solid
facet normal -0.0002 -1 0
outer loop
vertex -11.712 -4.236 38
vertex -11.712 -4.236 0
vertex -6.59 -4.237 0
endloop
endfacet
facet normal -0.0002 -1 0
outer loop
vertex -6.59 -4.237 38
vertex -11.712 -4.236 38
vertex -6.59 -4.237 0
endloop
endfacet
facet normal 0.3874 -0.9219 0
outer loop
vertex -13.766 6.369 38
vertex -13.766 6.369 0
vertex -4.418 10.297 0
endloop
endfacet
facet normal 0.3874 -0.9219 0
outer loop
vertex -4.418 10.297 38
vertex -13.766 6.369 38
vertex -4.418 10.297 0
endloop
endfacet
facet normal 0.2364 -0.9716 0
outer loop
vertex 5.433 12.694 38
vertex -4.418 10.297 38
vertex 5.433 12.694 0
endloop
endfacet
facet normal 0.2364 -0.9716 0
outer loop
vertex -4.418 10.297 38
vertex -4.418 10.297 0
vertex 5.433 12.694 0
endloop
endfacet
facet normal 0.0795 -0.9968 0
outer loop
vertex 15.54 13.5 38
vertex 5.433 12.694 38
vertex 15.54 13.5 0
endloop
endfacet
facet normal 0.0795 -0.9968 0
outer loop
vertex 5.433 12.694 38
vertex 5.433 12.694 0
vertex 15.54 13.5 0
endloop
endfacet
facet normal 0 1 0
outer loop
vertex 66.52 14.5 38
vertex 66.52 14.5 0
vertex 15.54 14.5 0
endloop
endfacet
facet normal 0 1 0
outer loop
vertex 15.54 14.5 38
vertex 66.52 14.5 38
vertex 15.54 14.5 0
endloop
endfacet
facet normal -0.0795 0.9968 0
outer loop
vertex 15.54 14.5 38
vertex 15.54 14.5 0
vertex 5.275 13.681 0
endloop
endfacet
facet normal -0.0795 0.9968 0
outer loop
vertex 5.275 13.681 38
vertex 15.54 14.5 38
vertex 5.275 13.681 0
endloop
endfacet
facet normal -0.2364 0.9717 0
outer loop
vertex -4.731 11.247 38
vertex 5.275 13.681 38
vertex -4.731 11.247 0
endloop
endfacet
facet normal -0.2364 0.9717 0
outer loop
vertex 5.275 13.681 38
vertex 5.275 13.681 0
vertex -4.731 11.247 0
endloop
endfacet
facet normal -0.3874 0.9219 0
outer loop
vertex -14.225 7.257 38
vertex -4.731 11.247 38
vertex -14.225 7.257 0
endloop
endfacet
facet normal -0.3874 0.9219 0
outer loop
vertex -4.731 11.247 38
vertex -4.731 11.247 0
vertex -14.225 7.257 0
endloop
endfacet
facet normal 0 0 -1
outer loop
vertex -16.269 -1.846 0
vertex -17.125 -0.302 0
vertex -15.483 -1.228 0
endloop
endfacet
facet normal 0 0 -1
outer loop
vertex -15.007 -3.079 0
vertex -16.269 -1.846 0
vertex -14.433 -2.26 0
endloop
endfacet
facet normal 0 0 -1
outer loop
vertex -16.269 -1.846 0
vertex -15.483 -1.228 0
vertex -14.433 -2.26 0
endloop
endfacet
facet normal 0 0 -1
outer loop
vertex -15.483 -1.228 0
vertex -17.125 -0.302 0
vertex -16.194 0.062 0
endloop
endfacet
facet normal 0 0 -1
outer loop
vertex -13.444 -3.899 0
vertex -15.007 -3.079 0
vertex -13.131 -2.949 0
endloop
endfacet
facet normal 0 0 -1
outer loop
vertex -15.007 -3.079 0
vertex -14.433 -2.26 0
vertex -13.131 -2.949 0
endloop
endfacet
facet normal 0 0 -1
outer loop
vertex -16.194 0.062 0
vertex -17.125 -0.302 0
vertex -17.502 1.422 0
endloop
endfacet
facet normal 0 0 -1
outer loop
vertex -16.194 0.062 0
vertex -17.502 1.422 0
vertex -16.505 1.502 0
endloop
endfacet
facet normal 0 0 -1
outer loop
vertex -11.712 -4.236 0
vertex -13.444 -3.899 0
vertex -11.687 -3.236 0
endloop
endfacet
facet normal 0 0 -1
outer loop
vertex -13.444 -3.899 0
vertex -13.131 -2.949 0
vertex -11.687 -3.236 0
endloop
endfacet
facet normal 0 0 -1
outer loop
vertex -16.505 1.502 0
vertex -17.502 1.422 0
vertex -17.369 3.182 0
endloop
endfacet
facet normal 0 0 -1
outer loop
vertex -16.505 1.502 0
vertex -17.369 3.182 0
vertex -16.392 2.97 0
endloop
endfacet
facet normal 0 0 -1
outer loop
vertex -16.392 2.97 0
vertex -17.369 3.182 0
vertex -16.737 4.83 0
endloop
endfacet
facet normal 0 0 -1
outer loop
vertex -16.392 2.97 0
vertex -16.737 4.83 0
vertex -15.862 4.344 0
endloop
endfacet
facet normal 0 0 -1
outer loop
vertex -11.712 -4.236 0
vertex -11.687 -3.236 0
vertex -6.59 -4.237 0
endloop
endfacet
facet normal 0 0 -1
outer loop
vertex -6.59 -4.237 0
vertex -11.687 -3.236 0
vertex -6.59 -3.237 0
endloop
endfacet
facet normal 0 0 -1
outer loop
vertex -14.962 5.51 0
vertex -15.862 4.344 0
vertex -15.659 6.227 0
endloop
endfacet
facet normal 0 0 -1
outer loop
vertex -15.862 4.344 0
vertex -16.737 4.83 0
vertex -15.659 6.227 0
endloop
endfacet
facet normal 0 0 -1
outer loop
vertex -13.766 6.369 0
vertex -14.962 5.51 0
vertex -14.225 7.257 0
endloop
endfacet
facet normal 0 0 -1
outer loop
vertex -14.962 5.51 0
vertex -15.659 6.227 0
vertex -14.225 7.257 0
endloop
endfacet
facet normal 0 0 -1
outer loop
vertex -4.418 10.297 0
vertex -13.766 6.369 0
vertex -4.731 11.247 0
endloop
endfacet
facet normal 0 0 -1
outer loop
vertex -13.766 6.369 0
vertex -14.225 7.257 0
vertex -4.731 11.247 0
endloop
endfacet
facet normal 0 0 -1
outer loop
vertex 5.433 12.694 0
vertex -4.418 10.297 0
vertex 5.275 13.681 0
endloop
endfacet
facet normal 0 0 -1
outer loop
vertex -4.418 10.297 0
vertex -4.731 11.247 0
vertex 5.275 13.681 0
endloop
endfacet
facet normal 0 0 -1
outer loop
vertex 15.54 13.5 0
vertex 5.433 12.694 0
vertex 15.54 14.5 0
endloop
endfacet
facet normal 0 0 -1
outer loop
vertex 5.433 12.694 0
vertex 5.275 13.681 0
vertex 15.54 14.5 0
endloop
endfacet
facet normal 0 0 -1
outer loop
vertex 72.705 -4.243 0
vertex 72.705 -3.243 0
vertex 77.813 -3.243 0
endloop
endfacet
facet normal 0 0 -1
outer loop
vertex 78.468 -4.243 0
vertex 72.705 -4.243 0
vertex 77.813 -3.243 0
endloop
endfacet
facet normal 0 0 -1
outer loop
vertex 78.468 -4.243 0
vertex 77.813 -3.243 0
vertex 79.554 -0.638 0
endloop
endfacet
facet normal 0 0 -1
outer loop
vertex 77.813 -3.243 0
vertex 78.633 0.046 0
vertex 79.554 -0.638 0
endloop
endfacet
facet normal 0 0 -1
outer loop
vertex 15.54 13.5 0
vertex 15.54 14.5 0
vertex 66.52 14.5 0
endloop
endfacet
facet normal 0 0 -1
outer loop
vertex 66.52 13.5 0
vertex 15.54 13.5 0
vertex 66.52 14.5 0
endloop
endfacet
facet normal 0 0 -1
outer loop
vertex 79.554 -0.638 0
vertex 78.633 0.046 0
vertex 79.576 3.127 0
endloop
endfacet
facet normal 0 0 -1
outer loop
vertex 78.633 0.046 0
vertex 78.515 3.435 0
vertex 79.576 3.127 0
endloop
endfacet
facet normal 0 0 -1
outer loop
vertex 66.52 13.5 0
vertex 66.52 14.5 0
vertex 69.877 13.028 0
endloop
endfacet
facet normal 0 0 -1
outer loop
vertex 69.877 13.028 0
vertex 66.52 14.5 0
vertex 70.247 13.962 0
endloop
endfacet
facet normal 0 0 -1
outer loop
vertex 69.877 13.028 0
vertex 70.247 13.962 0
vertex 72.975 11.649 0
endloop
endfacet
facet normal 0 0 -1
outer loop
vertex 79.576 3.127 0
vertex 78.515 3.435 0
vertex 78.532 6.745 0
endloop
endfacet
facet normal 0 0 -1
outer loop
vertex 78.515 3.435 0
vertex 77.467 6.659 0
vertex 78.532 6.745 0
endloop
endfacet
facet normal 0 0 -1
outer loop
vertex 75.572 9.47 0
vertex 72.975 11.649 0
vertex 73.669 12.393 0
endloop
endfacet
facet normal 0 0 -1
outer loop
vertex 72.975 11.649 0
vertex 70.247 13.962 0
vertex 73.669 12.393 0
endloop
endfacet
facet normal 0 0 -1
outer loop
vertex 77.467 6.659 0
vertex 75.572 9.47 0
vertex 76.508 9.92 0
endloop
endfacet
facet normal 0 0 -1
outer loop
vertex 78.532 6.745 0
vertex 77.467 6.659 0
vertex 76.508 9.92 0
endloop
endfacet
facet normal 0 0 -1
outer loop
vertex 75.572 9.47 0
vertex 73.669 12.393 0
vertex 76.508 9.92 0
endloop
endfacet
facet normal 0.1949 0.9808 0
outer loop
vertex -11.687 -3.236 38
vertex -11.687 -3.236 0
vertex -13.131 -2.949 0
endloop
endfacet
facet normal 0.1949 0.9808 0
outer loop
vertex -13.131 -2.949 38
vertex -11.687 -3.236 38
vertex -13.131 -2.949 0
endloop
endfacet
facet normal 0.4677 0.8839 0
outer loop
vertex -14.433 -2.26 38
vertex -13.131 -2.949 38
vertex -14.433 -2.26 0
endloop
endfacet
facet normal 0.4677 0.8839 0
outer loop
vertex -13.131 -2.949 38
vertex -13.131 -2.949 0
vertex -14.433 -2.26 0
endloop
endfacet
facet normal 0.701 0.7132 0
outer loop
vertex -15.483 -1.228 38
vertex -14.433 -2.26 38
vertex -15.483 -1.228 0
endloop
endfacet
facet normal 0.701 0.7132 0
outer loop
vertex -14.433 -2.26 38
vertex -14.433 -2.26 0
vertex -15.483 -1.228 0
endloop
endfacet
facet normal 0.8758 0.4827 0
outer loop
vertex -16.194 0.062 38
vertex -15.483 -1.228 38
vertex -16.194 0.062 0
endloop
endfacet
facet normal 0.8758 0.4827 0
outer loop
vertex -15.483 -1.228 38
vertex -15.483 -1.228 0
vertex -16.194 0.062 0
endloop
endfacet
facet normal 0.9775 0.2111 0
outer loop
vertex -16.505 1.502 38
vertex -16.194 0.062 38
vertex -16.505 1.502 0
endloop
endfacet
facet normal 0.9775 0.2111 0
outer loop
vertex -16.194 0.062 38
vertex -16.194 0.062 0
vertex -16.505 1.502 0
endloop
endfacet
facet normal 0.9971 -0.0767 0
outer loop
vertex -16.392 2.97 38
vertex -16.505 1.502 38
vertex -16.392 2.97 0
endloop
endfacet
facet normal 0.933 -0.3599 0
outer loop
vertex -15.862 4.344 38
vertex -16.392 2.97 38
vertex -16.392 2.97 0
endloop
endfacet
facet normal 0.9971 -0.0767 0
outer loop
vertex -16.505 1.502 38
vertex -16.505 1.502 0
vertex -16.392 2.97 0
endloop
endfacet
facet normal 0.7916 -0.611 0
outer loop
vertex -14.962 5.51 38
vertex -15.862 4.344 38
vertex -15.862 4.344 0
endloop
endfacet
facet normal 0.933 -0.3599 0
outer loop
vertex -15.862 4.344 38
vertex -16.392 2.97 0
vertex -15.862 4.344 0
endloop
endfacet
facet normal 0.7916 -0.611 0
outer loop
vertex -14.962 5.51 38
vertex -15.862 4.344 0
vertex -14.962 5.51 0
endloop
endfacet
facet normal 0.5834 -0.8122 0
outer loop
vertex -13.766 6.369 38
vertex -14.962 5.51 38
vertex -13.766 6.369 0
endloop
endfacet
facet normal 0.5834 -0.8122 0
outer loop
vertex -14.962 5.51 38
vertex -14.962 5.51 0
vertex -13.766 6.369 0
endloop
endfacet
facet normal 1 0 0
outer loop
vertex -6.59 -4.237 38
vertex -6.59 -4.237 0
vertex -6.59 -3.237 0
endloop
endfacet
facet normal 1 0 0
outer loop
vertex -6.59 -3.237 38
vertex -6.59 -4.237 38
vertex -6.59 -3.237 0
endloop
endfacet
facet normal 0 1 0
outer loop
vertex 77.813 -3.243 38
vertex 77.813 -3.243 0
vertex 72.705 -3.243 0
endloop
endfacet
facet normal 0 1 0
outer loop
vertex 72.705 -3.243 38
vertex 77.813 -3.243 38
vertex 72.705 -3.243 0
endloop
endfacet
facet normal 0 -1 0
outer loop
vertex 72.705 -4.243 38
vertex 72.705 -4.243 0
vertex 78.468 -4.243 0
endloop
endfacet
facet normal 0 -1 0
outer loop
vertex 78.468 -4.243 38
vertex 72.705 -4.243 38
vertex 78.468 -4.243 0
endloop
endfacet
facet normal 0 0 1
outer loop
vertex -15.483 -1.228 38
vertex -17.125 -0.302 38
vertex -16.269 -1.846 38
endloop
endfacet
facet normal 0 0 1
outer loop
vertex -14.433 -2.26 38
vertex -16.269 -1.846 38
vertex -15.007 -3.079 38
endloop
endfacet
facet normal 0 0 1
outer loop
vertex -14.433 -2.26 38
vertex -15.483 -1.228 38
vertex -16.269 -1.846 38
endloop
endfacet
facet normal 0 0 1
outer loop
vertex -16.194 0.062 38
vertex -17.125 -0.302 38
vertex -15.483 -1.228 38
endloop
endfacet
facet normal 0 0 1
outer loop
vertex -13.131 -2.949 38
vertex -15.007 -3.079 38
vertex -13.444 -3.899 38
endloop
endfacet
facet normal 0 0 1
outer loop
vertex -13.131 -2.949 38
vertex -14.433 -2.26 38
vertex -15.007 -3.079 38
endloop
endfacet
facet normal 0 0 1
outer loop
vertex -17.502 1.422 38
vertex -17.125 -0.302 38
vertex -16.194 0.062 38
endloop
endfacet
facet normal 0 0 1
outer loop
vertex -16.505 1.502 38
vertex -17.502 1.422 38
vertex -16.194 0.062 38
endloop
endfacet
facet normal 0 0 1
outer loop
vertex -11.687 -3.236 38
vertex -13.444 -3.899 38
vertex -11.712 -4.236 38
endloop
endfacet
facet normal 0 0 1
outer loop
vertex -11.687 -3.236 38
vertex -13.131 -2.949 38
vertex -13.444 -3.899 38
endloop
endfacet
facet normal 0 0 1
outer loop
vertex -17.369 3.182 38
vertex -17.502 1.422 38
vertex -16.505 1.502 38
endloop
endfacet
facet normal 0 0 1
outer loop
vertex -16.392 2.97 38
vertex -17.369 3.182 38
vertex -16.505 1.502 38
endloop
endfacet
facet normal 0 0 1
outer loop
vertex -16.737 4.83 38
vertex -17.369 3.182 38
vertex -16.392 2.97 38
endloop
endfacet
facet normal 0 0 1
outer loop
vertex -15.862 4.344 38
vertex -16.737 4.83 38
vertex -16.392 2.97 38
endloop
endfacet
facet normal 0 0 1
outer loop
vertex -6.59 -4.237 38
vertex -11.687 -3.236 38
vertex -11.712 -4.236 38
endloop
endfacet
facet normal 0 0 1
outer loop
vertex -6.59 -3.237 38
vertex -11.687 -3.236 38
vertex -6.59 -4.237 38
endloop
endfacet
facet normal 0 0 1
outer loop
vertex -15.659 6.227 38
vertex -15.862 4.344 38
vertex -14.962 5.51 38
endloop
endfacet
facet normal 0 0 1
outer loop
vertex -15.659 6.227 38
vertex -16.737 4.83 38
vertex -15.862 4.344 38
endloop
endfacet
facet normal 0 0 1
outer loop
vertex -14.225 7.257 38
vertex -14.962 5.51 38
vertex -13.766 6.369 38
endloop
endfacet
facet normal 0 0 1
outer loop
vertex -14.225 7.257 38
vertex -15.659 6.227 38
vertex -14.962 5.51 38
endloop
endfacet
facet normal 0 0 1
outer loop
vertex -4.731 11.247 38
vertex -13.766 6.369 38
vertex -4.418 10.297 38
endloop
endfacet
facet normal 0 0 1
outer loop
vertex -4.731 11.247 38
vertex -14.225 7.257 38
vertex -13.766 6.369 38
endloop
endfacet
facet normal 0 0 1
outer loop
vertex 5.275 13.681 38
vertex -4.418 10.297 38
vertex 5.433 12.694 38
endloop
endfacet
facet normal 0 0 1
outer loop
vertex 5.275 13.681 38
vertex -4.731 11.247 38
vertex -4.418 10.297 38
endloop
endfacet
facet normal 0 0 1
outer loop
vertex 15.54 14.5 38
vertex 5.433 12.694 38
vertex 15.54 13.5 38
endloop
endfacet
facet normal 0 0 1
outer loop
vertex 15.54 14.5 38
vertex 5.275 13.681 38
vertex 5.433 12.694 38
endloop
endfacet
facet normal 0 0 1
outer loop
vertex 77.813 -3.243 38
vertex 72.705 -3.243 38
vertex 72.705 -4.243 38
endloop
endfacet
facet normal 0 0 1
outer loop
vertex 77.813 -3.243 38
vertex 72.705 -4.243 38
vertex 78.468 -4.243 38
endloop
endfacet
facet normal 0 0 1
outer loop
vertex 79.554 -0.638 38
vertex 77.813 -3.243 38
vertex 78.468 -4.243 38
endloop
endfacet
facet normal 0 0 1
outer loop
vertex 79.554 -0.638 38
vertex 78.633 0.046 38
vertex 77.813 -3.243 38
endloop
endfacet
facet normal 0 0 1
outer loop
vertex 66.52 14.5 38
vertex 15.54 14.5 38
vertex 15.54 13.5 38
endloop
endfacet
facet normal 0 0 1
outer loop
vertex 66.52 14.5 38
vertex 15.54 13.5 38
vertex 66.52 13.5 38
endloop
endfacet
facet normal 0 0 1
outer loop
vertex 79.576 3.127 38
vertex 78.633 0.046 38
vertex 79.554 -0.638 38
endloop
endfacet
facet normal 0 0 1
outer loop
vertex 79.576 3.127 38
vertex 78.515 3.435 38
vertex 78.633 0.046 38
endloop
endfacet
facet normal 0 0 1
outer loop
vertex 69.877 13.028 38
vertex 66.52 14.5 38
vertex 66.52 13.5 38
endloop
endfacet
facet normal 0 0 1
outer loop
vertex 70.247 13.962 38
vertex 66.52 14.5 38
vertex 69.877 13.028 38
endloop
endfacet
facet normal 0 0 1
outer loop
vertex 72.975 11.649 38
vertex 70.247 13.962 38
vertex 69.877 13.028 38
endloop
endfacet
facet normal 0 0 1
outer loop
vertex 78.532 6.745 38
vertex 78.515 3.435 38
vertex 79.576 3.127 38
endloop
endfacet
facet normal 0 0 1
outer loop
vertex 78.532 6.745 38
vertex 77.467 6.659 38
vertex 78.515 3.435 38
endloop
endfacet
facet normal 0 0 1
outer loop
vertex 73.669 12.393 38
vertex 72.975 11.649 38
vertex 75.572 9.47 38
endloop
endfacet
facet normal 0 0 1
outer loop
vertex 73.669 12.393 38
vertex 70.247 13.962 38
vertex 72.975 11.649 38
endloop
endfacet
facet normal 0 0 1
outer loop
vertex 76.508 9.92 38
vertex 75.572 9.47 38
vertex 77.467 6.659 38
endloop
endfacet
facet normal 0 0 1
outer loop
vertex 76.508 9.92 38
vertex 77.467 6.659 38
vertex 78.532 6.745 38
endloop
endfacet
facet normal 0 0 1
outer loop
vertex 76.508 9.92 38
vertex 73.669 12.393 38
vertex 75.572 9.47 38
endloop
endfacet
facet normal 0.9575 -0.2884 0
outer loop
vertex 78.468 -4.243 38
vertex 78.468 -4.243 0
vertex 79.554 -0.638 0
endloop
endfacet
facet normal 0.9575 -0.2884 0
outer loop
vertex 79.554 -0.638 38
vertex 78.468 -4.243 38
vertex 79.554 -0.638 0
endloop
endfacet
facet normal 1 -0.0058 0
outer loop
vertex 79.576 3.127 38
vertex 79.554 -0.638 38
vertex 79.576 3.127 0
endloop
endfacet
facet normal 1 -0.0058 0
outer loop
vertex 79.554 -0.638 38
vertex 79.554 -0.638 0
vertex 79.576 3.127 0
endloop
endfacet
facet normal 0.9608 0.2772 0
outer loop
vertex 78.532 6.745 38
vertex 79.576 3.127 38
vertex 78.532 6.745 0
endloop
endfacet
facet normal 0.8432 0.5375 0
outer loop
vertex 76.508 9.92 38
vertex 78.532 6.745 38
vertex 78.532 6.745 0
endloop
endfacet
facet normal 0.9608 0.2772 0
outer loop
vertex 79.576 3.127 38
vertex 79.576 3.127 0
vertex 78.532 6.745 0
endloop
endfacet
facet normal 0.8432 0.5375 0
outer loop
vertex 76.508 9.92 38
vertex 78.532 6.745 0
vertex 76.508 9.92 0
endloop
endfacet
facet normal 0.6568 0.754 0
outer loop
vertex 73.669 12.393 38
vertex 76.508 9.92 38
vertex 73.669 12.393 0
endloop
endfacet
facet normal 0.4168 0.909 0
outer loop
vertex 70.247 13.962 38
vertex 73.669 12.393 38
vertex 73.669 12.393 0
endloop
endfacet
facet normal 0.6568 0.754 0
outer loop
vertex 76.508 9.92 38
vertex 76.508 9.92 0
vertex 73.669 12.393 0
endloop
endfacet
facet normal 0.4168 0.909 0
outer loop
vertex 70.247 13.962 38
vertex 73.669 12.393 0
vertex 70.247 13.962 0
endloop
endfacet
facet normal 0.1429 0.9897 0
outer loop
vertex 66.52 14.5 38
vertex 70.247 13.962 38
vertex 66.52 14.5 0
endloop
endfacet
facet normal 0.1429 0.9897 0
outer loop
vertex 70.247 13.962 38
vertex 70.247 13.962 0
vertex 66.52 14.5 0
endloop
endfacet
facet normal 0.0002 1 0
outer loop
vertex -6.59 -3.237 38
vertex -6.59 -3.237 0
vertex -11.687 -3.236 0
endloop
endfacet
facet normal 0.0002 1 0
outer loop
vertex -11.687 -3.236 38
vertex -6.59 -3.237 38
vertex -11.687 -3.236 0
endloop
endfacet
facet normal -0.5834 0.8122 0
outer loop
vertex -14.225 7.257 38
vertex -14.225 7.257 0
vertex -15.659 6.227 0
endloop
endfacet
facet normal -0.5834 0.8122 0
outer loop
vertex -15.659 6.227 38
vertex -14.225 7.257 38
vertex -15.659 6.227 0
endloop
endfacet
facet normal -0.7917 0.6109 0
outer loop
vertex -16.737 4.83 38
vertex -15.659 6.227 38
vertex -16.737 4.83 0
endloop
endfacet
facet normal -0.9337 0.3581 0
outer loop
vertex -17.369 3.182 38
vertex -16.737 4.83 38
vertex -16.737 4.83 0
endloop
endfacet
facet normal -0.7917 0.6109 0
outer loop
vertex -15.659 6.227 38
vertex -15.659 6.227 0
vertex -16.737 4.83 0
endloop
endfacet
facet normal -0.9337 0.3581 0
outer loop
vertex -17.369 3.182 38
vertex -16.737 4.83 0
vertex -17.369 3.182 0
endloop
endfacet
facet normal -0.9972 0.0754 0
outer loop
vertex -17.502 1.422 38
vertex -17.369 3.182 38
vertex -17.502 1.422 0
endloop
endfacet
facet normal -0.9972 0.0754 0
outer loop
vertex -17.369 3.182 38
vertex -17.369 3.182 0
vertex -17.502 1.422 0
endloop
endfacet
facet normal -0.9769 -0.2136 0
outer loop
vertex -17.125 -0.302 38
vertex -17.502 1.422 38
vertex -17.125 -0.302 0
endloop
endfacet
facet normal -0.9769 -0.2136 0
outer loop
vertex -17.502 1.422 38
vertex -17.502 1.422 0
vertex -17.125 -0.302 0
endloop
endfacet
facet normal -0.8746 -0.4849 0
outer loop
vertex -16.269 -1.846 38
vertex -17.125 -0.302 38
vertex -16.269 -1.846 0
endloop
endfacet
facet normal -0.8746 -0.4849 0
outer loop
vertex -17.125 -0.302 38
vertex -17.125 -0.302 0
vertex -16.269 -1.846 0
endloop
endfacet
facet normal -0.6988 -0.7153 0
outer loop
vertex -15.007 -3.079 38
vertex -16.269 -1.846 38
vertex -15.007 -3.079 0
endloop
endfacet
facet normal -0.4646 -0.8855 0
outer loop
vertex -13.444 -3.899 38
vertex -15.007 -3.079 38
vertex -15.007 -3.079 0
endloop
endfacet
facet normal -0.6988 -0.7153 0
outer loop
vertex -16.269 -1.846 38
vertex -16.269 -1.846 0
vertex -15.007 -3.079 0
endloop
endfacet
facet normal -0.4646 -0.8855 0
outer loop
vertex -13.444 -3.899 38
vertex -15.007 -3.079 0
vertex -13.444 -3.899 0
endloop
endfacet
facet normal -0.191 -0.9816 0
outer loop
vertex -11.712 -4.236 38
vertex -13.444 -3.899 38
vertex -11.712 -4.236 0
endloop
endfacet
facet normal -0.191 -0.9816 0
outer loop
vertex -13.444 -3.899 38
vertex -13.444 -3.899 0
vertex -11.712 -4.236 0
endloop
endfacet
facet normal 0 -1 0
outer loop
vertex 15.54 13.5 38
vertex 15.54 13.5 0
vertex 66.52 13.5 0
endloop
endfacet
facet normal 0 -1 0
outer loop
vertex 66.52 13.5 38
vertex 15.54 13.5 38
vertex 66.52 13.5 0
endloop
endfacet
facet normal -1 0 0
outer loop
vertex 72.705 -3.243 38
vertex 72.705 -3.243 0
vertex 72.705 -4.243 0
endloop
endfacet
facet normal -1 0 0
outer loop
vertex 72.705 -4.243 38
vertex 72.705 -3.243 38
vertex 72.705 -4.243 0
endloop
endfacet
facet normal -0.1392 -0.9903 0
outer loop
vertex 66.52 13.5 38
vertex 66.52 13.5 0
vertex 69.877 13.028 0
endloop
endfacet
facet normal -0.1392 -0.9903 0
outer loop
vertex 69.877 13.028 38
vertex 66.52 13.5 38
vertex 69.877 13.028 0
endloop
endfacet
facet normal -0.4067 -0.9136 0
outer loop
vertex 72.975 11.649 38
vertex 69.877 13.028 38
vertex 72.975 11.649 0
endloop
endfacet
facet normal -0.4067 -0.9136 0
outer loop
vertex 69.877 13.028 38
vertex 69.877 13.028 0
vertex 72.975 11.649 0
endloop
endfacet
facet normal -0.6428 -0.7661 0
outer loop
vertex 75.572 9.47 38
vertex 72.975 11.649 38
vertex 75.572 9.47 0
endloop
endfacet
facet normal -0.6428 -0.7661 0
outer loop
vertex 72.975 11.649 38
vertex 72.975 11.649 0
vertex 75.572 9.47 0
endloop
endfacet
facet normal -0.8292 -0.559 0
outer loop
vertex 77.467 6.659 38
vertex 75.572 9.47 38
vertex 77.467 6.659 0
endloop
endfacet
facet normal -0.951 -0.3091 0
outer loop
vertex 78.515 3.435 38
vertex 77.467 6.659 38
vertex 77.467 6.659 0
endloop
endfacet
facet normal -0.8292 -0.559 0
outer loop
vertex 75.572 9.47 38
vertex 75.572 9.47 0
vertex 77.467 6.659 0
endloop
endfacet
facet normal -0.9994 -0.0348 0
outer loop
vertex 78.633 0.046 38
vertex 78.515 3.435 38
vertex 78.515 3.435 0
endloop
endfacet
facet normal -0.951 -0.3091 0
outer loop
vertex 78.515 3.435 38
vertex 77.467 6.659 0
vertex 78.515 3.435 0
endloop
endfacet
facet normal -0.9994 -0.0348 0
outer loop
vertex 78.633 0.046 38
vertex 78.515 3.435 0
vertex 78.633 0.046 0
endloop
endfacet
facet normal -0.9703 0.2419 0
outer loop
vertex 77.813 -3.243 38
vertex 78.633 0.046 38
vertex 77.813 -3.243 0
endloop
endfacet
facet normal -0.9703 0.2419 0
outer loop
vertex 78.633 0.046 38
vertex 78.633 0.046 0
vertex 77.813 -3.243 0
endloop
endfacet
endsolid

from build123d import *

# Parameters (mm, degrees)
BOSS_EXTRUDE1_DEPTH = 38


with BuildPart() as part:
    # Sketch1 → Boss-Extrude1 (new body)
    with BuildSketch(Plane.XY):
        with BuildLine():
            Line((66.52, 14.5), (15.54, 14.5))
            ThreePointArc((15.54, 14.5), (0.223169493, 12.66316181), (-14.225037528, 7.256815055))
            ThreePointArc((-14.225037528, 7.256815055), (-17.376400179, 0.546177113), (-11.711514098, -4.236375954))
            Line((-11.711514098, -4.236375954), (-6.590403043, -4.236765961))
            Line((-6.590403043, -4.236765961), (-6.590326886, -3.236765964))
            Line((-6.590326886, -3.236765964), (-11.687025279, -3.236377816))
            ThreePointArc((-11.687025279, -3.236377816), (-16.401861513, 0.77072863), (-13.765555848, 6.368627808))
            ThreePointArc((-13.765555848, 6.368627808), (0.459614785, 11.691517006), (15.54, 13.5))
            Line((15.54, 13.5), (66.52, 13.5))
            ThreePointArc((66.52, 13.5), (76.617843982, 8.130760845), (77.812974461, -3.243193847))
            Line((77.812974461, -3.243193847), (72.705055873, -3.242804844))
            Line((72.705055873, -3.242804844), (72.704979716, -4.242804841))
            Line((72.704979716, -4.242804841), (78.468410832, -4.243243765))
            ThreePointArc((78.468410832, -4.243243765), (77.633884428, 8.404811863), (66.52, 14.5))
        make_face()
    extrude(amount=BOSS_EXTRUDE1_DEPTH)


solid = part.part
